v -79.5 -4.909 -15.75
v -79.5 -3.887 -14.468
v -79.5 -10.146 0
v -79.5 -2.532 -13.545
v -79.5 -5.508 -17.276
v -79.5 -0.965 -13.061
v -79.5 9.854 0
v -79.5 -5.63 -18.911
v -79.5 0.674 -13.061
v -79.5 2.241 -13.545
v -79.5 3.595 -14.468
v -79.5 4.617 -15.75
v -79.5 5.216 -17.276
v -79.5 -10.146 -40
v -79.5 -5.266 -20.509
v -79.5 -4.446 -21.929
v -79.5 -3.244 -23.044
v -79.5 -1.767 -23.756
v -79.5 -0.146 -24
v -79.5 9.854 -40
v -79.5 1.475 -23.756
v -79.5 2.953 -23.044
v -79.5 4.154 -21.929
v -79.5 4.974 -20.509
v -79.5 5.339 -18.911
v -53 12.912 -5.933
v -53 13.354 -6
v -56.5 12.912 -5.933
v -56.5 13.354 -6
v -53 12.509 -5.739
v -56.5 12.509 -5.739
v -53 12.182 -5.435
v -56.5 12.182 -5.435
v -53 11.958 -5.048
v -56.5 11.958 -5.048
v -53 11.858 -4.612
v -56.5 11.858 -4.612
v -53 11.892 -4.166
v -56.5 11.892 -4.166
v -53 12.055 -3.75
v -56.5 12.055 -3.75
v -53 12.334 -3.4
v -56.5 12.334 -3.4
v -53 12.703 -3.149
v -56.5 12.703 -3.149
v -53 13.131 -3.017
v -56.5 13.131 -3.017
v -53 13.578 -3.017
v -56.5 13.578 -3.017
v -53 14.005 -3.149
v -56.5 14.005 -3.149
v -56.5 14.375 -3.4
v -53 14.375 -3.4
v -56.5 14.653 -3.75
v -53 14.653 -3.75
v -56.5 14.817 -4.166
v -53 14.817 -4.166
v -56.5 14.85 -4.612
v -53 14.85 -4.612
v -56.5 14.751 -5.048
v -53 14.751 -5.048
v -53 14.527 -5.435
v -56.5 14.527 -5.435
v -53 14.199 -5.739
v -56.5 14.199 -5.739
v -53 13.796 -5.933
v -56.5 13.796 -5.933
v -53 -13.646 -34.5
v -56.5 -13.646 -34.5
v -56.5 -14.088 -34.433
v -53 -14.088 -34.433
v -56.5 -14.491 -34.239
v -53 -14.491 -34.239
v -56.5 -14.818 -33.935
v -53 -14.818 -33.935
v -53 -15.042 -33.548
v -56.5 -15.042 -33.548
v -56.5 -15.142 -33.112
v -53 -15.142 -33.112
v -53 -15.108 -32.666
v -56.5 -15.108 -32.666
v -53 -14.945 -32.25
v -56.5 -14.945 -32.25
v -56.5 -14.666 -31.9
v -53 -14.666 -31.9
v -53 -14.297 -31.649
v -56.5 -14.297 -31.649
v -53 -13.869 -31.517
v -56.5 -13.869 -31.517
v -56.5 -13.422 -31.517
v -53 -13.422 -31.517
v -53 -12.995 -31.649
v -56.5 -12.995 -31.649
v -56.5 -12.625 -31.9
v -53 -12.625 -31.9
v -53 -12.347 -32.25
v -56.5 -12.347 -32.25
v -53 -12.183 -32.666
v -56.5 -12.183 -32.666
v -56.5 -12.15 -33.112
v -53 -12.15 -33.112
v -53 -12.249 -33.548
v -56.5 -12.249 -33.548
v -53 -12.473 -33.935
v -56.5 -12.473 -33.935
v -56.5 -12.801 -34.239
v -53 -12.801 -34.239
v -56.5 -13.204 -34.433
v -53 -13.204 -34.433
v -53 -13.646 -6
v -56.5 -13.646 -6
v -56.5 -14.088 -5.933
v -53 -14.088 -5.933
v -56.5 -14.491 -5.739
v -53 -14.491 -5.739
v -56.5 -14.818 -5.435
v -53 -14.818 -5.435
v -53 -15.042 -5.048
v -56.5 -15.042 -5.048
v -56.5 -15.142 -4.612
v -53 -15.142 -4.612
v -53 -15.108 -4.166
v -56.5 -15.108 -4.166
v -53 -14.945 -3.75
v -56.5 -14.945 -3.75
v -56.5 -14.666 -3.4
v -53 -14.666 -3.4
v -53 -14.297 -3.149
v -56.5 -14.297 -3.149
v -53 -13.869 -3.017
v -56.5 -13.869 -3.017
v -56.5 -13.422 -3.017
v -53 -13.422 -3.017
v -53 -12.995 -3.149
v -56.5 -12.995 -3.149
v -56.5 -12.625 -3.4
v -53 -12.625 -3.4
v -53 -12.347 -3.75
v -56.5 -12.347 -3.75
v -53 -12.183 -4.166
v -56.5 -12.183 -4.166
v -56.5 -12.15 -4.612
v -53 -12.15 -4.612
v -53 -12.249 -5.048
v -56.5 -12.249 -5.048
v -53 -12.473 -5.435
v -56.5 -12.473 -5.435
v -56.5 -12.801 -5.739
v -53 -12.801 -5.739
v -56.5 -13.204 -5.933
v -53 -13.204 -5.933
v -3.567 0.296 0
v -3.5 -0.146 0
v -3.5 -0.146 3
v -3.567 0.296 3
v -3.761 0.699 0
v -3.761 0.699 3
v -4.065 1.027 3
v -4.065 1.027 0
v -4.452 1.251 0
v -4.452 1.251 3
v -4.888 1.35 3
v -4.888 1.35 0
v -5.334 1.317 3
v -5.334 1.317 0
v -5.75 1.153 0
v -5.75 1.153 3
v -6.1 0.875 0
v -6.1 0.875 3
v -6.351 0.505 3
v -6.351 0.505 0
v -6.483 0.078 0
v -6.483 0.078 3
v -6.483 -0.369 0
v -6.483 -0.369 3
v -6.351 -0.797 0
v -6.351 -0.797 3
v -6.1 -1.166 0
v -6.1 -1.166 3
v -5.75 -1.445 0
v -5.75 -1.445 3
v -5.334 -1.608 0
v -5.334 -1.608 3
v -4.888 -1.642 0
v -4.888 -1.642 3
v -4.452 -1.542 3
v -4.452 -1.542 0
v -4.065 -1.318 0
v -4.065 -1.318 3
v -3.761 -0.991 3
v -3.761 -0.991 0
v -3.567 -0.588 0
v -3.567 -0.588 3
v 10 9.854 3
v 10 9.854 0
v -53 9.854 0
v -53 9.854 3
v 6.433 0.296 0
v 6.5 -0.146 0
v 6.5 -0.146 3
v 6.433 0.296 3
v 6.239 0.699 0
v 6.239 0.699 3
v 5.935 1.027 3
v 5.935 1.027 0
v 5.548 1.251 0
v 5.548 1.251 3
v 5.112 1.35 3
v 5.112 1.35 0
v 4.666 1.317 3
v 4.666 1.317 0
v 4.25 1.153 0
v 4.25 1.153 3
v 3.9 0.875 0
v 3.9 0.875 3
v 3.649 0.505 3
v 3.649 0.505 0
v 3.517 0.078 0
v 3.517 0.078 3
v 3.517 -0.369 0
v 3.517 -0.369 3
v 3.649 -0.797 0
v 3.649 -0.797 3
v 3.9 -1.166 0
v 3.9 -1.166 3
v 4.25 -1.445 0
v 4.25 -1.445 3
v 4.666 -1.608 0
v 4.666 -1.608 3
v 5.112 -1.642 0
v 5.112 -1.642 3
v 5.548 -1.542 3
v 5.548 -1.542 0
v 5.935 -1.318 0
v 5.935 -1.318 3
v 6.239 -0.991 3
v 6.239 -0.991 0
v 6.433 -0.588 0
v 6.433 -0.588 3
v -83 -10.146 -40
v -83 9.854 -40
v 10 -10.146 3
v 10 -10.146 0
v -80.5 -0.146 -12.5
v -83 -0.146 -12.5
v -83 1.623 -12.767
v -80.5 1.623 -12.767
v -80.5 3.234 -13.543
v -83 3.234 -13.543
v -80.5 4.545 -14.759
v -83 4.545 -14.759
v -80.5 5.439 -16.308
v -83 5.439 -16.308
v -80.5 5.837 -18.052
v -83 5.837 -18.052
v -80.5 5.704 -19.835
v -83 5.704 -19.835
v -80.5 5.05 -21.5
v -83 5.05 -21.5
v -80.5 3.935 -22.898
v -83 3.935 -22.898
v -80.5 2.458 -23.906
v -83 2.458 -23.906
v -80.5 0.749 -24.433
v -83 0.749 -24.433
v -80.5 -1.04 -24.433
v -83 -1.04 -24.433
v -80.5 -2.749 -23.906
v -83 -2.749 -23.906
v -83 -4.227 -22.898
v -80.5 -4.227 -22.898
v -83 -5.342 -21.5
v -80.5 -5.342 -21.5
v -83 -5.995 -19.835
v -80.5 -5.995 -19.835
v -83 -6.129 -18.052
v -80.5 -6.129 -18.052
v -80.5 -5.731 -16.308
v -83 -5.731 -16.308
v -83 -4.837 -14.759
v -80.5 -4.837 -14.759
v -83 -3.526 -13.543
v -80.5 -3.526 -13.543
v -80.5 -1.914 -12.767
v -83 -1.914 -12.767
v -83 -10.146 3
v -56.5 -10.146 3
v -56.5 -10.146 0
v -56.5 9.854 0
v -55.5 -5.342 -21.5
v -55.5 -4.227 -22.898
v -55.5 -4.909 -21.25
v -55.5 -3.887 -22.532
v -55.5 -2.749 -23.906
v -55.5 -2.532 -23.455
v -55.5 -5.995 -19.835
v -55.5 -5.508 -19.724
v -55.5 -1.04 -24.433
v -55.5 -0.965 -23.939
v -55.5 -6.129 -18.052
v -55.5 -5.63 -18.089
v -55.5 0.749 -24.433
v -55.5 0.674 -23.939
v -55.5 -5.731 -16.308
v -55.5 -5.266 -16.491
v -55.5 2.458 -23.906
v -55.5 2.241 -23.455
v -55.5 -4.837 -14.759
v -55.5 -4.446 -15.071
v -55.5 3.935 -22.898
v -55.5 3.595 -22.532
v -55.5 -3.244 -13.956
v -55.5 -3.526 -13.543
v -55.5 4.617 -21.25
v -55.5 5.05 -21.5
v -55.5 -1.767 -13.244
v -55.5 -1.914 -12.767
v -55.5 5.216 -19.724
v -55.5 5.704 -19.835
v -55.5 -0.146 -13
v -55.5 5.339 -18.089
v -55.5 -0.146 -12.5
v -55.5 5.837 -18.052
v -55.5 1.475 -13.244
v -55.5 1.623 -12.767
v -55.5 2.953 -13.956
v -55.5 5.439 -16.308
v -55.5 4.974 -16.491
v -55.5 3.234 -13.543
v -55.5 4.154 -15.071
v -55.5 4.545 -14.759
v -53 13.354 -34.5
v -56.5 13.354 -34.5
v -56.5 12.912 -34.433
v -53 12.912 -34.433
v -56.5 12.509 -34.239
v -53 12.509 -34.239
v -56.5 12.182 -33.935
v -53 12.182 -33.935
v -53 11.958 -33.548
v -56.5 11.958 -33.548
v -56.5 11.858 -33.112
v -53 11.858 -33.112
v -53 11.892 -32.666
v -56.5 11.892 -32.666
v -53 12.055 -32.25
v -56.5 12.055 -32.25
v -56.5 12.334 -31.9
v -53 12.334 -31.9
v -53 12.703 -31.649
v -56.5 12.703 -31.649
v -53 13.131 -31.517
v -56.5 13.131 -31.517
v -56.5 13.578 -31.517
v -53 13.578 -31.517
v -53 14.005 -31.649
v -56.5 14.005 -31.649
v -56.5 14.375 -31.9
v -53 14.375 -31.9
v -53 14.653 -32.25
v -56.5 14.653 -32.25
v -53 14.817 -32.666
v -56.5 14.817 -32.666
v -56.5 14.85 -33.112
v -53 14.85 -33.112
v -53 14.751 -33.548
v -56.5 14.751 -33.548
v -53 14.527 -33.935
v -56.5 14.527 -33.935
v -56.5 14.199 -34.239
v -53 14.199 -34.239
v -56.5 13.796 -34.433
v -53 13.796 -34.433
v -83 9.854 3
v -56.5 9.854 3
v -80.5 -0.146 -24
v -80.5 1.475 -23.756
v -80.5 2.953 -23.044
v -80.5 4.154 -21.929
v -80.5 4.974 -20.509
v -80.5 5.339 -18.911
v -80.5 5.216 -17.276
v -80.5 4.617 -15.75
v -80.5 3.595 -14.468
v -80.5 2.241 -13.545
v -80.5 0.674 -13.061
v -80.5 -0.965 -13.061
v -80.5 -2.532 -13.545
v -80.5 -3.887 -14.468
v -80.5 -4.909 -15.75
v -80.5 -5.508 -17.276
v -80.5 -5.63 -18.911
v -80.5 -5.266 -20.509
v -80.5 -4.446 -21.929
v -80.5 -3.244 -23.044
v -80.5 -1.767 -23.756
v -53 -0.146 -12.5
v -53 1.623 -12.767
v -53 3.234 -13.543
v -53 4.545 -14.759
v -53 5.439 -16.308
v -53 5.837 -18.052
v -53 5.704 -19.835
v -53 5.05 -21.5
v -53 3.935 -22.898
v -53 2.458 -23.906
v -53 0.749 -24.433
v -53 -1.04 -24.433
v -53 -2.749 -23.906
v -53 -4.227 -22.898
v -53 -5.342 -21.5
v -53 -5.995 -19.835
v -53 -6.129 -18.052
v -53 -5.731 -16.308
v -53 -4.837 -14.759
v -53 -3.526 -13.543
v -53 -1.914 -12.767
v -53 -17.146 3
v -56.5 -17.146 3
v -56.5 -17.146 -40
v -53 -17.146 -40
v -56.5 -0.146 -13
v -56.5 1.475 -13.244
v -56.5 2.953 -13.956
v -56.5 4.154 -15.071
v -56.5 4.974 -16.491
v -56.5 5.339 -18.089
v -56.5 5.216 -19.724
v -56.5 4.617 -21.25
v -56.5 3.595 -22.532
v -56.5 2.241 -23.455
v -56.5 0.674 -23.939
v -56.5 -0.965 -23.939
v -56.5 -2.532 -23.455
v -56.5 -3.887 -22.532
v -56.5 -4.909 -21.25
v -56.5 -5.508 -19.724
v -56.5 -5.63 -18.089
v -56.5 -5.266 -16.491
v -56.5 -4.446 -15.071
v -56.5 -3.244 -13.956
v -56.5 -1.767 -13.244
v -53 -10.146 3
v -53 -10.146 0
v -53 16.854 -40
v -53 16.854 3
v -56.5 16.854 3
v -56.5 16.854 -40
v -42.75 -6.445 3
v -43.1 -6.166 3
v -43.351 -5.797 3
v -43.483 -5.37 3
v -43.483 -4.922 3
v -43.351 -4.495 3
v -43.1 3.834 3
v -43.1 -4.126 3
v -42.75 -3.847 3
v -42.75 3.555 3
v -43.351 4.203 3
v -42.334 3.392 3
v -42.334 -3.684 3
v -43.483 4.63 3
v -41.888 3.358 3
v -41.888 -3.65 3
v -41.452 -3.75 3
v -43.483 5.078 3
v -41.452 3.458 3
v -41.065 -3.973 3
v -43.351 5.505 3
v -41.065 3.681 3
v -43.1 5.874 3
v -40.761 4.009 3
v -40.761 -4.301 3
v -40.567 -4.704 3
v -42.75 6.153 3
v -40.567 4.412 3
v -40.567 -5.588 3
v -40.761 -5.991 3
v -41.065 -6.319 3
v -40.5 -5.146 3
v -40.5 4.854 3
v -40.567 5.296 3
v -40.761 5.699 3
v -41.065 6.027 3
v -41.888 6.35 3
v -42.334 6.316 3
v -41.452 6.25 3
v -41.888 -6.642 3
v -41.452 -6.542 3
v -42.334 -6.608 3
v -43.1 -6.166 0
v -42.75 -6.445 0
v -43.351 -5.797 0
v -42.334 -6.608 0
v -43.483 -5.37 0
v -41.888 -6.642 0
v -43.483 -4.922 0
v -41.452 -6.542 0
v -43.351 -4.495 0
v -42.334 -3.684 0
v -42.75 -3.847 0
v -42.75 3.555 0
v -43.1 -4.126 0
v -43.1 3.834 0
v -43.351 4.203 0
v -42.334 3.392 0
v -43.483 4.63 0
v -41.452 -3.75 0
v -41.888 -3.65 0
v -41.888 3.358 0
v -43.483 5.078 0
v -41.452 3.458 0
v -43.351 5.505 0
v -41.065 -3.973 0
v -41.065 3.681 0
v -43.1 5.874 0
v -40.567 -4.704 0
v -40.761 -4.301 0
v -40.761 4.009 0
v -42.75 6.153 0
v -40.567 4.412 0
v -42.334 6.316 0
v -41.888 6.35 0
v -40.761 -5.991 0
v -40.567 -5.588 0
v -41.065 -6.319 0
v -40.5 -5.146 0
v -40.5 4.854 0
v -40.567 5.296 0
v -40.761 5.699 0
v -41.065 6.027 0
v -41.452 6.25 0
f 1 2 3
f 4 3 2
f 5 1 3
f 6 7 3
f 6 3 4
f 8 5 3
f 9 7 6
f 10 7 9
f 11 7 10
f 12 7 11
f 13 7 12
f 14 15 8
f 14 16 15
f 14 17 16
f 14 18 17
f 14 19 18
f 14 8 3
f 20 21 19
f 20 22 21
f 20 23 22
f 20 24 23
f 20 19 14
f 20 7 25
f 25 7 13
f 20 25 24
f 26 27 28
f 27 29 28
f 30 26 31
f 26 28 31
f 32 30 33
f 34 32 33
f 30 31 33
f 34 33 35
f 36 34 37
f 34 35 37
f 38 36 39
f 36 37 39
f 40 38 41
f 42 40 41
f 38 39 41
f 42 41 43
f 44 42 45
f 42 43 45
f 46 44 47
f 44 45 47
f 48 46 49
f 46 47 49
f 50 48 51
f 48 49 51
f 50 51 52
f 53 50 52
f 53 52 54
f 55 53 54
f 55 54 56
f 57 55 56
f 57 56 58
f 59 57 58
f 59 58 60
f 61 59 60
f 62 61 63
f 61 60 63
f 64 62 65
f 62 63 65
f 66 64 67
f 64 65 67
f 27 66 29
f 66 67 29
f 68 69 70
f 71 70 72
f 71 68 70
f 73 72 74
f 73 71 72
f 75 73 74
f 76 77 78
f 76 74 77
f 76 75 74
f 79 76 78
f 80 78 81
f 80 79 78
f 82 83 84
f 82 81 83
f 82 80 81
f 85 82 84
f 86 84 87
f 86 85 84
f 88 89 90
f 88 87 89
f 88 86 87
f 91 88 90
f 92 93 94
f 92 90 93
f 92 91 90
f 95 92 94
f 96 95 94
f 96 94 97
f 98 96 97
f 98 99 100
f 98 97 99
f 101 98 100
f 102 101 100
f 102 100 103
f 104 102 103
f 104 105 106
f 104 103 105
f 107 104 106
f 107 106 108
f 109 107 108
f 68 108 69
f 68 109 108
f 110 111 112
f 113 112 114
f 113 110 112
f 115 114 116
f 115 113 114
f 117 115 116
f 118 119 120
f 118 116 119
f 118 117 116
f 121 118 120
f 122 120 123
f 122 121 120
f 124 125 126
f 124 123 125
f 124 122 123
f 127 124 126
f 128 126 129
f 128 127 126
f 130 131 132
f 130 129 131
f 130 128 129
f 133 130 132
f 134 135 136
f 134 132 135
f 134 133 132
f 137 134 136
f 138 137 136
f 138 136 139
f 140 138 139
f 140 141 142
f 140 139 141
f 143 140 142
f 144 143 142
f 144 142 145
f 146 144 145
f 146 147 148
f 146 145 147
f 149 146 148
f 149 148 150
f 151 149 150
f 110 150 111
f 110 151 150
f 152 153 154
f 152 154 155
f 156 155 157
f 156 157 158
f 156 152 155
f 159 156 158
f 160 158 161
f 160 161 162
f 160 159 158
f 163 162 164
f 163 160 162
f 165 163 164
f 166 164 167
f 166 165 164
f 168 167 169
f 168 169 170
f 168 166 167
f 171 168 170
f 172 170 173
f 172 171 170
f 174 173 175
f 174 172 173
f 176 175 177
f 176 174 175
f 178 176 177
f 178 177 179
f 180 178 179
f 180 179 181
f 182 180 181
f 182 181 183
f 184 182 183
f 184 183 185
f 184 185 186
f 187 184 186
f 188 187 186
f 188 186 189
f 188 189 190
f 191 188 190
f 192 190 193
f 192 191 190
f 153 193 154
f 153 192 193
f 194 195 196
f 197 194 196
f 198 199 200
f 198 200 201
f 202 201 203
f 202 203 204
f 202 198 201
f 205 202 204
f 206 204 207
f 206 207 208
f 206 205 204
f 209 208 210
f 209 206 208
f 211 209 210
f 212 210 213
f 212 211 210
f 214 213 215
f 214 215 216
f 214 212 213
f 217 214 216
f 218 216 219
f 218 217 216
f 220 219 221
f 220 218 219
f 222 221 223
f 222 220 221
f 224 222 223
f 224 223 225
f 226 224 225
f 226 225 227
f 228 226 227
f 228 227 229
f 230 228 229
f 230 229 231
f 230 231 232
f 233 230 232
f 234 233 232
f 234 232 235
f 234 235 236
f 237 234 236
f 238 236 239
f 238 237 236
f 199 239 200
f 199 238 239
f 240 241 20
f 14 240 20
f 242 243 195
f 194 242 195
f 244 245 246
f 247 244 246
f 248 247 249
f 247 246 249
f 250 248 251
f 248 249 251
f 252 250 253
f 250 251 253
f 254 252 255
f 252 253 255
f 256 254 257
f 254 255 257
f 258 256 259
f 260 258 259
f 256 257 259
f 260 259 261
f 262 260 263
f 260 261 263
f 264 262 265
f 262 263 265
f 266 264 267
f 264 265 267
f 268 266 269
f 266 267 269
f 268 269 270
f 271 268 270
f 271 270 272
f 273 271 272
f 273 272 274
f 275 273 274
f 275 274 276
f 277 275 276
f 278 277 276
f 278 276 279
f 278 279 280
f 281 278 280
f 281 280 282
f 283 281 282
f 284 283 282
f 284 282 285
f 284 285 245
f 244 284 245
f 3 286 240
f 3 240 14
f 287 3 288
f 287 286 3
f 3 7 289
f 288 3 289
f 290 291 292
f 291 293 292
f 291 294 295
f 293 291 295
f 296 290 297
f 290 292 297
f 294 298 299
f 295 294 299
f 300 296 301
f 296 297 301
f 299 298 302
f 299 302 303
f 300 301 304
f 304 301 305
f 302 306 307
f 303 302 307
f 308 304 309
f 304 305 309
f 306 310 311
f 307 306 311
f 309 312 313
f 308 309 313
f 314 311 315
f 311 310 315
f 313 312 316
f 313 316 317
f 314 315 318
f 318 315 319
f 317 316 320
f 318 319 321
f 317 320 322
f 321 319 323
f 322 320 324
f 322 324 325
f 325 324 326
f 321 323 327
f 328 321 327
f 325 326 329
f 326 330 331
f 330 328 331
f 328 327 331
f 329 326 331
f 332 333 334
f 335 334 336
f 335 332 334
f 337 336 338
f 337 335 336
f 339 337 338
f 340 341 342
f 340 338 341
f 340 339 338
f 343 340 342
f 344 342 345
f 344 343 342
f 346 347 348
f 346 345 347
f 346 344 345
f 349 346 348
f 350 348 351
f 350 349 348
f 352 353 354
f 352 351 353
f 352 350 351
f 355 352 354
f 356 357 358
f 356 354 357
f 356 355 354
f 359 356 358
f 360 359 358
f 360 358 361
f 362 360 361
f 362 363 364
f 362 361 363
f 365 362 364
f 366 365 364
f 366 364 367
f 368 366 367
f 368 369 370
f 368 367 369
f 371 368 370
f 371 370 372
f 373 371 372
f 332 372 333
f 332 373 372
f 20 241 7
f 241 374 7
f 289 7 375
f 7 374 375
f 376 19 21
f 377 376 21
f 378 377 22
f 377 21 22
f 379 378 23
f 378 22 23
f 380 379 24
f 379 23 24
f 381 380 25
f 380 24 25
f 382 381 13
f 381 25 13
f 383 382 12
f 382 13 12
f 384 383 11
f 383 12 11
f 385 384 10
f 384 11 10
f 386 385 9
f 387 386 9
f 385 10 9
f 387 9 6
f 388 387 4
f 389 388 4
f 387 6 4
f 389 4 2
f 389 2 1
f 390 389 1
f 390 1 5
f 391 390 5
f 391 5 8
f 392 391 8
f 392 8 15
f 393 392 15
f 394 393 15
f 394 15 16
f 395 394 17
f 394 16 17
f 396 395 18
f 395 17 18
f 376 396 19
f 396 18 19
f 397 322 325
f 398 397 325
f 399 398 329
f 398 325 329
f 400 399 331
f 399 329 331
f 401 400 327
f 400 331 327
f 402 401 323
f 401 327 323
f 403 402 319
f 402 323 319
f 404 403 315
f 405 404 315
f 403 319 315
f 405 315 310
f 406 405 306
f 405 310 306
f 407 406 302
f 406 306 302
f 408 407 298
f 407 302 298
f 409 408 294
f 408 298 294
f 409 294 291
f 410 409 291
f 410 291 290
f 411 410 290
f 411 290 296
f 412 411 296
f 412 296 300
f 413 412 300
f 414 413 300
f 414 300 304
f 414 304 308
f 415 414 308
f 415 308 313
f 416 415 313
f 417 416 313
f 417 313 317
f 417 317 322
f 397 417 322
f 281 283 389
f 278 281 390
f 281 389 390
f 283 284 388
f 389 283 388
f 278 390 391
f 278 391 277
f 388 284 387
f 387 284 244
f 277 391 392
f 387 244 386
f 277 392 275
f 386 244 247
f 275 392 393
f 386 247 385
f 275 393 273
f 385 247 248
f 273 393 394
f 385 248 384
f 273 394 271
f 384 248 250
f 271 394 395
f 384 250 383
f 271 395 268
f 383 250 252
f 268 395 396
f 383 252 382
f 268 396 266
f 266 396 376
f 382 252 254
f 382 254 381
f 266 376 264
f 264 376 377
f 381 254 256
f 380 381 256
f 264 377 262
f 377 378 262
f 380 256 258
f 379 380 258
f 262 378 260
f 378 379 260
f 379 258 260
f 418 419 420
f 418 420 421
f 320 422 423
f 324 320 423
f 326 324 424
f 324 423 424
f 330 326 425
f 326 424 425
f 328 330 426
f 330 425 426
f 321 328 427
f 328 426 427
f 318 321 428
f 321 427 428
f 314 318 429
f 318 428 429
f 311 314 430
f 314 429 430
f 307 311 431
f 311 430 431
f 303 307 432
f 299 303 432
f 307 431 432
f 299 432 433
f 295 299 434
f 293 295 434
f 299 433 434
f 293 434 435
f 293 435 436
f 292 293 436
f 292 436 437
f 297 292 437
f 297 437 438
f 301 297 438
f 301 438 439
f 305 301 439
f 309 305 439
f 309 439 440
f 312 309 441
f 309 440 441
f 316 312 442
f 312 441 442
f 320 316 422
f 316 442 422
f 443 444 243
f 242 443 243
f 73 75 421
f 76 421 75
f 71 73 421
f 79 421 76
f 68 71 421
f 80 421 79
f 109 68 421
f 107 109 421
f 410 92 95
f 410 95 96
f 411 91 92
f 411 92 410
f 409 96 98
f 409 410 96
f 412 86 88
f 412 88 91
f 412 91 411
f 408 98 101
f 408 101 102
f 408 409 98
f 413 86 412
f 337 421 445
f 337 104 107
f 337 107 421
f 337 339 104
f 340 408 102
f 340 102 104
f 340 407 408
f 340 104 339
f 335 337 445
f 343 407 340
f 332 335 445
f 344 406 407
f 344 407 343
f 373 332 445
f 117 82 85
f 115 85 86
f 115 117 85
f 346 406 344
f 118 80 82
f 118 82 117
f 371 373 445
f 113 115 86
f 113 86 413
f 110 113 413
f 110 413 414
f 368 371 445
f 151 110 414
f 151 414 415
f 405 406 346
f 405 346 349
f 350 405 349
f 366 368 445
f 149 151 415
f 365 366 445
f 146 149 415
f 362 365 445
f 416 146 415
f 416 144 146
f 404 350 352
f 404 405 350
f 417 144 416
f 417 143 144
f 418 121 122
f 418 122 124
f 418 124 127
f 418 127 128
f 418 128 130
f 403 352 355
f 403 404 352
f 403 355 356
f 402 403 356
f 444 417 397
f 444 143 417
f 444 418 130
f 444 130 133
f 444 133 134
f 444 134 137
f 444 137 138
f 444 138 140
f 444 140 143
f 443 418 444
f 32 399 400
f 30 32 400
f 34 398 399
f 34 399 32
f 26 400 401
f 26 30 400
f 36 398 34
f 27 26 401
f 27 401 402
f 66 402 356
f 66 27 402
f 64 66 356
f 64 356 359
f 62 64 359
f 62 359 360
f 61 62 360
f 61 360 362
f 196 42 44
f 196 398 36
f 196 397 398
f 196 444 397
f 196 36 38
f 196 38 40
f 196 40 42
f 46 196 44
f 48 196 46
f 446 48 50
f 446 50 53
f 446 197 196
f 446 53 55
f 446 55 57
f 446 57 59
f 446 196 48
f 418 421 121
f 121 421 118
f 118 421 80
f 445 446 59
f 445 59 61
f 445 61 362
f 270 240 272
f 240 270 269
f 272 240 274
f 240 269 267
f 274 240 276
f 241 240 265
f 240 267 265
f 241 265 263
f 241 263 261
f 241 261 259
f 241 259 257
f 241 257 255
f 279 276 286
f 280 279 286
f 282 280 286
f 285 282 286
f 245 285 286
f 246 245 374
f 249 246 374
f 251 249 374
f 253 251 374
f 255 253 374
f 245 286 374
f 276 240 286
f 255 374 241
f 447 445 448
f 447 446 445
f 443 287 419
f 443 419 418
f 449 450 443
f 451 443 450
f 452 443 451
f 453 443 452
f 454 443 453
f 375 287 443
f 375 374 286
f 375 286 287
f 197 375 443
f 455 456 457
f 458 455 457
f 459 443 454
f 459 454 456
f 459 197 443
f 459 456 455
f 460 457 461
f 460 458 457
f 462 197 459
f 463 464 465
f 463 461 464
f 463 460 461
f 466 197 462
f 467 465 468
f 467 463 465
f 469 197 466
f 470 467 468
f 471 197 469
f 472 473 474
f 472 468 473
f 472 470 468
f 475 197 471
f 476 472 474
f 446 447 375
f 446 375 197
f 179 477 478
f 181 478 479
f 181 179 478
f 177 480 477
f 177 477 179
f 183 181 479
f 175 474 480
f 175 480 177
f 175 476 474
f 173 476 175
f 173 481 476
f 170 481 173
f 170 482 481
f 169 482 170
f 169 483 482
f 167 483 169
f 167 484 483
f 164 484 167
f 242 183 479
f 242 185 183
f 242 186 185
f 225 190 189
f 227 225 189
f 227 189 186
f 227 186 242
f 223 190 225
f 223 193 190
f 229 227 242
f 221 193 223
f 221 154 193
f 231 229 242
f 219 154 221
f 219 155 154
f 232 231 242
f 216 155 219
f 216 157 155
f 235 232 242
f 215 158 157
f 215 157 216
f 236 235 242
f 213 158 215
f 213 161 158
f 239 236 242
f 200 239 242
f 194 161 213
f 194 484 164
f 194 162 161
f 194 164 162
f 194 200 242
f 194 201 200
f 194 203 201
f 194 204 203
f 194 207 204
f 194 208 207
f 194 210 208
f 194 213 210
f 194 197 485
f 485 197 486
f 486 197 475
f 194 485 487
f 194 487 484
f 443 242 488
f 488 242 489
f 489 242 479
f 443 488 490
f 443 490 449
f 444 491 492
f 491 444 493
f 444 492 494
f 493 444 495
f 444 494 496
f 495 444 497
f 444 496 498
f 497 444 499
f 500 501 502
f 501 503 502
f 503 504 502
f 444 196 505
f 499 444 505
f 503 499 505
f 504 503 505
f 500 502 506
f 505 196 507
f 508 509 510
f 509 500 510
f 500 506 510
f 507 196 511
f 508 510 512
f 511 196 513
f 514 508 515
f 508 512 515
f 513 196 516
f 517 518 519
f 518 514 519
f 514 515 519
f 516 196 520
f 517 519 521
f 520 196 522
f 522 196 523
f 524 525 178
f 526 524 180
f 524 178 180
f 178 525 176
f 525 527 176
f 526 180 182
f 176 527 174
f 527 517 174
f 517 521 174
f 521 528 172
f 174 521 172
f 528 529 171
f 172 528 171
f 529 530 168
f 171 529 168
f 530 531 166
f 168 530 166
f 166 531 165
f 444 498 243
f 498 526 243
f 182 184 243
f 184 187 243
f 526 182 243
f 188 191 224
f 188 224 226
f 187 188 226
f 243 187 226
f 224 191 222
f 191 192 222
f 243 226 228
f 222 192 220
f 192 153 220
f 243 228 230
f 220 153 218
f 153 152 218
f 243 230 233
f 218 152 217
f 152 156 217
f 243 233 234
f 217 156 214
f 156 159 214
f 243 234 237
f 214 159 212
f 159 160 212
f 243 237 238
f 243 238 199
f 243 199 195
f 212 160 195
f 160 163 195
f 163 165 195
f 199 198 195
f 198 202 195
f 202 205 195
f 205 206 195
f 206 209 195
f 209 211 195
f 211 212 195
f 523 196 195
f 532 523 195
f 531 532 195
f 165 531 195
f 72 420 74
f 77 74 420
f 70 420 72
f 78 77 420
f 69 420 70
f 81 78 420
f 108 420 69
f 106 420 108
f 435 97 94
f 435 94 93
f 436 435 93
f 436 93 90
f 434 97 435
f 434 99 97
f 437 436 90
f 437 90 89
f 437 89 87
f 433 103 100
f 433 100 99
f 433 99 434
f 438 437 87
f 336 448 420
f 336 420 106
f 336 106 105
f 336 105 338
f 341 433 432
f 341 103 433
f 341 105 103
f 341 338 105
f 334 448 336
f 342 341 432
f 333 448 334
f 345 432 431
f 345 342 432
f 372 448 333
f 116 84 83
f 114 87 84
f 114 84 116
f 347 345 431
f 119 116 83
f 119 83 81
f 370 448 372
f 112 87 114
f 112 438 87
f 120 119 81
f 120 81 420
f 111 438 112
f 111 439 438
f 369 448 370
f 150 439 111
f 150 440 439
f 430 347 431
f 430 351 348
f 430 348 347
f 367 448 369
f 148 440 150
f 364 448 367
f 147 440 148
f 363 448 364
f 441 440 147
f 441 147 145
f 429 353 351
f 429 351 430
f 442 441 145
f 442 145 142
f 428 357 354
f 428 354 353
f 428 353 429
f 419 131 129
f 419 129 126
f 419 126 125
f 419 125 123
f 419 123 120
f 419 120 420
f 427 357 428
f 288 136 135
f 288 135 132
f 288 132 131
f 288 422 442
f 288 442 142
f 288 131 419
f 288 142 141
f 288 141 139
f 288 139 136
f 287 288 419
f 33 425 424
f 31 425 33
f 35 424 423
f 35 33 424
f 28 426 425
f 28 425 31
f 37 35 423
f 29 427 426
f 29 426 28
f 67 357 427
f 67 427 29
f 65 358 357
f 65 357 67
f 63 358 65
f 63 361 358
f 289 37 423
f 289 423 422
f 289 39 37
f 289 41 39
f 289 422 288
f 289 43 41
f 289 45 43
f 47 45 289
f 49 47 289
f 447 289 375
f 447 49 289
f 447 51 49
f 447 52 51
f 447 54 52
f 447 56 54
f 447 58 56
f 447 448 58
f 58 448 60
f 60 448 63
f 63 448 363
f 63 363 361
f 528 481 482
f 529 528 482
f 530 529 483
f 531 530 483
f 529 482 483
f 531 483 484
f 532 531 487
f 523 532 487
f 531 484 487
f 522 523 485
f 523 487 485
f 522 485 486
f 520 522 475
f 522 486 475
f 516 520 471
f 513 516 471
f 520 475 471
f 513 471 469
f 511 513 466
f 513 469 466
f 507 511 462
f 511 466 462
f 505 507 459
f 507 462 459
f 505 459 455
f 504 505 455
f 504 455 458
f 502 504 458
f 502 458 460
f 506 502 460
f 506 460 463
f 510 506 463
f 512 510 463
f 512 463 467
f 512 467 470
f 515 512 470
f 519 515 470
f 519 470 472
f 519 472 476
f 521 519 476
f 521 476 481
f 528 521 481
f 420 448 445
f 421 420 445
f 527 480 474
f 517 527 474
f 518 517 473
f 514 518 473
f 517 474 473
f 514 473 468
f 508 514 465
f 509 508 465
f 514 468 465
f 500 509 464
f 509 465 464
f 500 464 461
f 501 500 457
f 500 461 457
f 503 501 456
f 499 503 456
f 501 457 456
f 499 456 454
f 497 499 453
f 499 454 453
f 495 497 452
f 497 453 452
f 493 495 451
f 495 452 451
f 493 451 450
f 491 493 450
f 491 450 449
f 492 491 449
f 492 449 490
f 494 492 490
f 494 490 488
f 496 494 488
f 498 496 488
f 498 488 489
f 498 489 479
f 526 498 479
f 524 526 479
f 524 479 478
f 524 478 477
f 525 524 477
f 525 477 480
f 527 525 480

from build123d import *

# Parameters (mm, degrees)
SKETCH_1_R          = 1.5
EXTRUDE_1_DEPTH     = 3
EXTRUDE_2_DEPTH     = 40
SKETCH_2_R          = 1.5
CUT_EXTRUDE_1_DEPTH = 10
SKETCH_1_4_W        = 3.5
SKETCH_1_4_H        = 20
EXTRUDE_3_DEPTH     = 40
SKETCH_3_R          = 6
CUT_EXTRUDE_2_DEPTH = 38
SKETCH_4_R          = 6
SKETCH_4_R_2        = 5.5
EXTRUDE_4_DEPTH     = 1
EXTRUDE_START       = -1
SKETCH_5_R          = 6
SKETCH_5_R_2        = 5.5
EXTRUDE_5_DEPTH     = 1
SKETCH_7_R          = 1.5
CUT_EXTRUDE_4_DEPTH = 5


with BuildPart() as part:
    # 草图1 → 凸台-拉伸1 (new body)
    with BuildSketch(Plane.XY):
        Polygon((10, 9.854248689), (-53, 9.854248689), (-53, 16.854248689), (-56.5, 16.854248689), (-56.5, 9.854248689), (-83, 9.854248689), (-83, -10.145751311), (-56.5, -10.145751311), (-56.5, -17.145751311), (-53, -17.145751311), (-53, -10.145751311), (10, -10.145751311), align=None)
        with Locations((-5, -0.145751311)):
            Circle(SKETCH_1_R, mode=Mode.SUBTRACT)
        with Locations((5, -0.145751311)):
            Circle(SKETCH_1_R, mode=Mode.SUBTRACT)
    extrude(amount=EXTRUDE_1_DEPTH)

    # 草图1<3> → 凸台-拉伸2 (add)
    with BuildSketch(Plane.XY):
        Polygon((-56.5, 16.854248689), (-56.5, 9.854248689), (-56.5, -10.145751311), (-56.5, -17.145751311), (-53, -17.145751311), (-53, -0.145751311), (-53, 16.854248689), align=None)
    extrude(amount=-EXTRUDE_2_DEPTH)

    # 草图2 → 切除-拉伸1 (cut, symmetric)
    with BuildSketch(Plane(origin=(-53, 0, 0), x_dir=(0, 0, -1), z_dir=(-1, 0, 0))):
        with Locations((33, -13.354248689)):
            Circle(SKETCH_2_R)
        with Locations((4.5, 13.645751311)):
            Circle(SKETCH_2_R)
        with Locations((33, 13.645751311)):
            Circle(SKETCH_2_R)
        with Locations((4.5, -13.354248689)):
            Circle(SKETCH_2_R)
    extrude(amount=CUT_EXTRUDE_1_DEPTH, both=True, mode=Mode.SUBTRACT)

    # 草图1<4> → 凸台-拉伸3 (add)
    with BuildSketch(Plane.XY):
        with Locations((-81.25, -0.145751311)):
            Rectangle(SKETCH_1_4_W, SKETCH_1_4_H)
    extrude(amount=-EXTRUDE_3_DEPTH)

    # 草图3 → 切除-拉伸2 (cut)
    with BuildSketch(Plane.ZY.offset(83)):
        with Locations((-18.5, -0.145751311)):
            Circle(SKETCH_3_R)
    extrude(amount=-CUT_EXTRUDE_2_DEPTH, mode=Mode.SUBTRACT)

    # 草图4 → 凸台-拉伸4 (add)
    with BuildSketch(Plane.ZY.offset(56.5)):
        with Locations((-18.5, -0.145751311)):
            Circle(SKETCH_4_R)
        with Locations((-18.5, -0.145751311)):
            Circle(SKETCH_4_R_2, mode=Mode.SUBTRACT)
    extrude(amount=-EXTRUDE_4_DEPTH)

    # 草图5 → 凸台-拉伸5 (add)
    with BuildSketch(Plane(origin=(-79.5, 0, 0), x_dir=(0, 0, -1), z_dir=(1, 0, 0)).offset(EXTRUDE_START)):
        with Locations((18.5, -0.145751311)):
            Circle(SKETCH_5_R)
        with Locations((18.5, -0.145751311)):
            Circle(SKETCH_5_R_2, mode=Mode.SUBTRACT)
    extrude(amount=EXTRUDE_5_DEPTH)

    # 草图7 → 切除-拉伸4 (cut)
    with BuildSketch(Plane.XY.offset(3)):
        with Locations((-42, -5.146051054)):
            Circle(SKETCH_7_R)
        with Locations((-42, 4.853948946)):
            Circle(SKETCH_7_R)
    extrude(amount=-CUT_EXTRUDE_4_DEPTH, mode=Mode.SUBTRACT)


solid = part.part
